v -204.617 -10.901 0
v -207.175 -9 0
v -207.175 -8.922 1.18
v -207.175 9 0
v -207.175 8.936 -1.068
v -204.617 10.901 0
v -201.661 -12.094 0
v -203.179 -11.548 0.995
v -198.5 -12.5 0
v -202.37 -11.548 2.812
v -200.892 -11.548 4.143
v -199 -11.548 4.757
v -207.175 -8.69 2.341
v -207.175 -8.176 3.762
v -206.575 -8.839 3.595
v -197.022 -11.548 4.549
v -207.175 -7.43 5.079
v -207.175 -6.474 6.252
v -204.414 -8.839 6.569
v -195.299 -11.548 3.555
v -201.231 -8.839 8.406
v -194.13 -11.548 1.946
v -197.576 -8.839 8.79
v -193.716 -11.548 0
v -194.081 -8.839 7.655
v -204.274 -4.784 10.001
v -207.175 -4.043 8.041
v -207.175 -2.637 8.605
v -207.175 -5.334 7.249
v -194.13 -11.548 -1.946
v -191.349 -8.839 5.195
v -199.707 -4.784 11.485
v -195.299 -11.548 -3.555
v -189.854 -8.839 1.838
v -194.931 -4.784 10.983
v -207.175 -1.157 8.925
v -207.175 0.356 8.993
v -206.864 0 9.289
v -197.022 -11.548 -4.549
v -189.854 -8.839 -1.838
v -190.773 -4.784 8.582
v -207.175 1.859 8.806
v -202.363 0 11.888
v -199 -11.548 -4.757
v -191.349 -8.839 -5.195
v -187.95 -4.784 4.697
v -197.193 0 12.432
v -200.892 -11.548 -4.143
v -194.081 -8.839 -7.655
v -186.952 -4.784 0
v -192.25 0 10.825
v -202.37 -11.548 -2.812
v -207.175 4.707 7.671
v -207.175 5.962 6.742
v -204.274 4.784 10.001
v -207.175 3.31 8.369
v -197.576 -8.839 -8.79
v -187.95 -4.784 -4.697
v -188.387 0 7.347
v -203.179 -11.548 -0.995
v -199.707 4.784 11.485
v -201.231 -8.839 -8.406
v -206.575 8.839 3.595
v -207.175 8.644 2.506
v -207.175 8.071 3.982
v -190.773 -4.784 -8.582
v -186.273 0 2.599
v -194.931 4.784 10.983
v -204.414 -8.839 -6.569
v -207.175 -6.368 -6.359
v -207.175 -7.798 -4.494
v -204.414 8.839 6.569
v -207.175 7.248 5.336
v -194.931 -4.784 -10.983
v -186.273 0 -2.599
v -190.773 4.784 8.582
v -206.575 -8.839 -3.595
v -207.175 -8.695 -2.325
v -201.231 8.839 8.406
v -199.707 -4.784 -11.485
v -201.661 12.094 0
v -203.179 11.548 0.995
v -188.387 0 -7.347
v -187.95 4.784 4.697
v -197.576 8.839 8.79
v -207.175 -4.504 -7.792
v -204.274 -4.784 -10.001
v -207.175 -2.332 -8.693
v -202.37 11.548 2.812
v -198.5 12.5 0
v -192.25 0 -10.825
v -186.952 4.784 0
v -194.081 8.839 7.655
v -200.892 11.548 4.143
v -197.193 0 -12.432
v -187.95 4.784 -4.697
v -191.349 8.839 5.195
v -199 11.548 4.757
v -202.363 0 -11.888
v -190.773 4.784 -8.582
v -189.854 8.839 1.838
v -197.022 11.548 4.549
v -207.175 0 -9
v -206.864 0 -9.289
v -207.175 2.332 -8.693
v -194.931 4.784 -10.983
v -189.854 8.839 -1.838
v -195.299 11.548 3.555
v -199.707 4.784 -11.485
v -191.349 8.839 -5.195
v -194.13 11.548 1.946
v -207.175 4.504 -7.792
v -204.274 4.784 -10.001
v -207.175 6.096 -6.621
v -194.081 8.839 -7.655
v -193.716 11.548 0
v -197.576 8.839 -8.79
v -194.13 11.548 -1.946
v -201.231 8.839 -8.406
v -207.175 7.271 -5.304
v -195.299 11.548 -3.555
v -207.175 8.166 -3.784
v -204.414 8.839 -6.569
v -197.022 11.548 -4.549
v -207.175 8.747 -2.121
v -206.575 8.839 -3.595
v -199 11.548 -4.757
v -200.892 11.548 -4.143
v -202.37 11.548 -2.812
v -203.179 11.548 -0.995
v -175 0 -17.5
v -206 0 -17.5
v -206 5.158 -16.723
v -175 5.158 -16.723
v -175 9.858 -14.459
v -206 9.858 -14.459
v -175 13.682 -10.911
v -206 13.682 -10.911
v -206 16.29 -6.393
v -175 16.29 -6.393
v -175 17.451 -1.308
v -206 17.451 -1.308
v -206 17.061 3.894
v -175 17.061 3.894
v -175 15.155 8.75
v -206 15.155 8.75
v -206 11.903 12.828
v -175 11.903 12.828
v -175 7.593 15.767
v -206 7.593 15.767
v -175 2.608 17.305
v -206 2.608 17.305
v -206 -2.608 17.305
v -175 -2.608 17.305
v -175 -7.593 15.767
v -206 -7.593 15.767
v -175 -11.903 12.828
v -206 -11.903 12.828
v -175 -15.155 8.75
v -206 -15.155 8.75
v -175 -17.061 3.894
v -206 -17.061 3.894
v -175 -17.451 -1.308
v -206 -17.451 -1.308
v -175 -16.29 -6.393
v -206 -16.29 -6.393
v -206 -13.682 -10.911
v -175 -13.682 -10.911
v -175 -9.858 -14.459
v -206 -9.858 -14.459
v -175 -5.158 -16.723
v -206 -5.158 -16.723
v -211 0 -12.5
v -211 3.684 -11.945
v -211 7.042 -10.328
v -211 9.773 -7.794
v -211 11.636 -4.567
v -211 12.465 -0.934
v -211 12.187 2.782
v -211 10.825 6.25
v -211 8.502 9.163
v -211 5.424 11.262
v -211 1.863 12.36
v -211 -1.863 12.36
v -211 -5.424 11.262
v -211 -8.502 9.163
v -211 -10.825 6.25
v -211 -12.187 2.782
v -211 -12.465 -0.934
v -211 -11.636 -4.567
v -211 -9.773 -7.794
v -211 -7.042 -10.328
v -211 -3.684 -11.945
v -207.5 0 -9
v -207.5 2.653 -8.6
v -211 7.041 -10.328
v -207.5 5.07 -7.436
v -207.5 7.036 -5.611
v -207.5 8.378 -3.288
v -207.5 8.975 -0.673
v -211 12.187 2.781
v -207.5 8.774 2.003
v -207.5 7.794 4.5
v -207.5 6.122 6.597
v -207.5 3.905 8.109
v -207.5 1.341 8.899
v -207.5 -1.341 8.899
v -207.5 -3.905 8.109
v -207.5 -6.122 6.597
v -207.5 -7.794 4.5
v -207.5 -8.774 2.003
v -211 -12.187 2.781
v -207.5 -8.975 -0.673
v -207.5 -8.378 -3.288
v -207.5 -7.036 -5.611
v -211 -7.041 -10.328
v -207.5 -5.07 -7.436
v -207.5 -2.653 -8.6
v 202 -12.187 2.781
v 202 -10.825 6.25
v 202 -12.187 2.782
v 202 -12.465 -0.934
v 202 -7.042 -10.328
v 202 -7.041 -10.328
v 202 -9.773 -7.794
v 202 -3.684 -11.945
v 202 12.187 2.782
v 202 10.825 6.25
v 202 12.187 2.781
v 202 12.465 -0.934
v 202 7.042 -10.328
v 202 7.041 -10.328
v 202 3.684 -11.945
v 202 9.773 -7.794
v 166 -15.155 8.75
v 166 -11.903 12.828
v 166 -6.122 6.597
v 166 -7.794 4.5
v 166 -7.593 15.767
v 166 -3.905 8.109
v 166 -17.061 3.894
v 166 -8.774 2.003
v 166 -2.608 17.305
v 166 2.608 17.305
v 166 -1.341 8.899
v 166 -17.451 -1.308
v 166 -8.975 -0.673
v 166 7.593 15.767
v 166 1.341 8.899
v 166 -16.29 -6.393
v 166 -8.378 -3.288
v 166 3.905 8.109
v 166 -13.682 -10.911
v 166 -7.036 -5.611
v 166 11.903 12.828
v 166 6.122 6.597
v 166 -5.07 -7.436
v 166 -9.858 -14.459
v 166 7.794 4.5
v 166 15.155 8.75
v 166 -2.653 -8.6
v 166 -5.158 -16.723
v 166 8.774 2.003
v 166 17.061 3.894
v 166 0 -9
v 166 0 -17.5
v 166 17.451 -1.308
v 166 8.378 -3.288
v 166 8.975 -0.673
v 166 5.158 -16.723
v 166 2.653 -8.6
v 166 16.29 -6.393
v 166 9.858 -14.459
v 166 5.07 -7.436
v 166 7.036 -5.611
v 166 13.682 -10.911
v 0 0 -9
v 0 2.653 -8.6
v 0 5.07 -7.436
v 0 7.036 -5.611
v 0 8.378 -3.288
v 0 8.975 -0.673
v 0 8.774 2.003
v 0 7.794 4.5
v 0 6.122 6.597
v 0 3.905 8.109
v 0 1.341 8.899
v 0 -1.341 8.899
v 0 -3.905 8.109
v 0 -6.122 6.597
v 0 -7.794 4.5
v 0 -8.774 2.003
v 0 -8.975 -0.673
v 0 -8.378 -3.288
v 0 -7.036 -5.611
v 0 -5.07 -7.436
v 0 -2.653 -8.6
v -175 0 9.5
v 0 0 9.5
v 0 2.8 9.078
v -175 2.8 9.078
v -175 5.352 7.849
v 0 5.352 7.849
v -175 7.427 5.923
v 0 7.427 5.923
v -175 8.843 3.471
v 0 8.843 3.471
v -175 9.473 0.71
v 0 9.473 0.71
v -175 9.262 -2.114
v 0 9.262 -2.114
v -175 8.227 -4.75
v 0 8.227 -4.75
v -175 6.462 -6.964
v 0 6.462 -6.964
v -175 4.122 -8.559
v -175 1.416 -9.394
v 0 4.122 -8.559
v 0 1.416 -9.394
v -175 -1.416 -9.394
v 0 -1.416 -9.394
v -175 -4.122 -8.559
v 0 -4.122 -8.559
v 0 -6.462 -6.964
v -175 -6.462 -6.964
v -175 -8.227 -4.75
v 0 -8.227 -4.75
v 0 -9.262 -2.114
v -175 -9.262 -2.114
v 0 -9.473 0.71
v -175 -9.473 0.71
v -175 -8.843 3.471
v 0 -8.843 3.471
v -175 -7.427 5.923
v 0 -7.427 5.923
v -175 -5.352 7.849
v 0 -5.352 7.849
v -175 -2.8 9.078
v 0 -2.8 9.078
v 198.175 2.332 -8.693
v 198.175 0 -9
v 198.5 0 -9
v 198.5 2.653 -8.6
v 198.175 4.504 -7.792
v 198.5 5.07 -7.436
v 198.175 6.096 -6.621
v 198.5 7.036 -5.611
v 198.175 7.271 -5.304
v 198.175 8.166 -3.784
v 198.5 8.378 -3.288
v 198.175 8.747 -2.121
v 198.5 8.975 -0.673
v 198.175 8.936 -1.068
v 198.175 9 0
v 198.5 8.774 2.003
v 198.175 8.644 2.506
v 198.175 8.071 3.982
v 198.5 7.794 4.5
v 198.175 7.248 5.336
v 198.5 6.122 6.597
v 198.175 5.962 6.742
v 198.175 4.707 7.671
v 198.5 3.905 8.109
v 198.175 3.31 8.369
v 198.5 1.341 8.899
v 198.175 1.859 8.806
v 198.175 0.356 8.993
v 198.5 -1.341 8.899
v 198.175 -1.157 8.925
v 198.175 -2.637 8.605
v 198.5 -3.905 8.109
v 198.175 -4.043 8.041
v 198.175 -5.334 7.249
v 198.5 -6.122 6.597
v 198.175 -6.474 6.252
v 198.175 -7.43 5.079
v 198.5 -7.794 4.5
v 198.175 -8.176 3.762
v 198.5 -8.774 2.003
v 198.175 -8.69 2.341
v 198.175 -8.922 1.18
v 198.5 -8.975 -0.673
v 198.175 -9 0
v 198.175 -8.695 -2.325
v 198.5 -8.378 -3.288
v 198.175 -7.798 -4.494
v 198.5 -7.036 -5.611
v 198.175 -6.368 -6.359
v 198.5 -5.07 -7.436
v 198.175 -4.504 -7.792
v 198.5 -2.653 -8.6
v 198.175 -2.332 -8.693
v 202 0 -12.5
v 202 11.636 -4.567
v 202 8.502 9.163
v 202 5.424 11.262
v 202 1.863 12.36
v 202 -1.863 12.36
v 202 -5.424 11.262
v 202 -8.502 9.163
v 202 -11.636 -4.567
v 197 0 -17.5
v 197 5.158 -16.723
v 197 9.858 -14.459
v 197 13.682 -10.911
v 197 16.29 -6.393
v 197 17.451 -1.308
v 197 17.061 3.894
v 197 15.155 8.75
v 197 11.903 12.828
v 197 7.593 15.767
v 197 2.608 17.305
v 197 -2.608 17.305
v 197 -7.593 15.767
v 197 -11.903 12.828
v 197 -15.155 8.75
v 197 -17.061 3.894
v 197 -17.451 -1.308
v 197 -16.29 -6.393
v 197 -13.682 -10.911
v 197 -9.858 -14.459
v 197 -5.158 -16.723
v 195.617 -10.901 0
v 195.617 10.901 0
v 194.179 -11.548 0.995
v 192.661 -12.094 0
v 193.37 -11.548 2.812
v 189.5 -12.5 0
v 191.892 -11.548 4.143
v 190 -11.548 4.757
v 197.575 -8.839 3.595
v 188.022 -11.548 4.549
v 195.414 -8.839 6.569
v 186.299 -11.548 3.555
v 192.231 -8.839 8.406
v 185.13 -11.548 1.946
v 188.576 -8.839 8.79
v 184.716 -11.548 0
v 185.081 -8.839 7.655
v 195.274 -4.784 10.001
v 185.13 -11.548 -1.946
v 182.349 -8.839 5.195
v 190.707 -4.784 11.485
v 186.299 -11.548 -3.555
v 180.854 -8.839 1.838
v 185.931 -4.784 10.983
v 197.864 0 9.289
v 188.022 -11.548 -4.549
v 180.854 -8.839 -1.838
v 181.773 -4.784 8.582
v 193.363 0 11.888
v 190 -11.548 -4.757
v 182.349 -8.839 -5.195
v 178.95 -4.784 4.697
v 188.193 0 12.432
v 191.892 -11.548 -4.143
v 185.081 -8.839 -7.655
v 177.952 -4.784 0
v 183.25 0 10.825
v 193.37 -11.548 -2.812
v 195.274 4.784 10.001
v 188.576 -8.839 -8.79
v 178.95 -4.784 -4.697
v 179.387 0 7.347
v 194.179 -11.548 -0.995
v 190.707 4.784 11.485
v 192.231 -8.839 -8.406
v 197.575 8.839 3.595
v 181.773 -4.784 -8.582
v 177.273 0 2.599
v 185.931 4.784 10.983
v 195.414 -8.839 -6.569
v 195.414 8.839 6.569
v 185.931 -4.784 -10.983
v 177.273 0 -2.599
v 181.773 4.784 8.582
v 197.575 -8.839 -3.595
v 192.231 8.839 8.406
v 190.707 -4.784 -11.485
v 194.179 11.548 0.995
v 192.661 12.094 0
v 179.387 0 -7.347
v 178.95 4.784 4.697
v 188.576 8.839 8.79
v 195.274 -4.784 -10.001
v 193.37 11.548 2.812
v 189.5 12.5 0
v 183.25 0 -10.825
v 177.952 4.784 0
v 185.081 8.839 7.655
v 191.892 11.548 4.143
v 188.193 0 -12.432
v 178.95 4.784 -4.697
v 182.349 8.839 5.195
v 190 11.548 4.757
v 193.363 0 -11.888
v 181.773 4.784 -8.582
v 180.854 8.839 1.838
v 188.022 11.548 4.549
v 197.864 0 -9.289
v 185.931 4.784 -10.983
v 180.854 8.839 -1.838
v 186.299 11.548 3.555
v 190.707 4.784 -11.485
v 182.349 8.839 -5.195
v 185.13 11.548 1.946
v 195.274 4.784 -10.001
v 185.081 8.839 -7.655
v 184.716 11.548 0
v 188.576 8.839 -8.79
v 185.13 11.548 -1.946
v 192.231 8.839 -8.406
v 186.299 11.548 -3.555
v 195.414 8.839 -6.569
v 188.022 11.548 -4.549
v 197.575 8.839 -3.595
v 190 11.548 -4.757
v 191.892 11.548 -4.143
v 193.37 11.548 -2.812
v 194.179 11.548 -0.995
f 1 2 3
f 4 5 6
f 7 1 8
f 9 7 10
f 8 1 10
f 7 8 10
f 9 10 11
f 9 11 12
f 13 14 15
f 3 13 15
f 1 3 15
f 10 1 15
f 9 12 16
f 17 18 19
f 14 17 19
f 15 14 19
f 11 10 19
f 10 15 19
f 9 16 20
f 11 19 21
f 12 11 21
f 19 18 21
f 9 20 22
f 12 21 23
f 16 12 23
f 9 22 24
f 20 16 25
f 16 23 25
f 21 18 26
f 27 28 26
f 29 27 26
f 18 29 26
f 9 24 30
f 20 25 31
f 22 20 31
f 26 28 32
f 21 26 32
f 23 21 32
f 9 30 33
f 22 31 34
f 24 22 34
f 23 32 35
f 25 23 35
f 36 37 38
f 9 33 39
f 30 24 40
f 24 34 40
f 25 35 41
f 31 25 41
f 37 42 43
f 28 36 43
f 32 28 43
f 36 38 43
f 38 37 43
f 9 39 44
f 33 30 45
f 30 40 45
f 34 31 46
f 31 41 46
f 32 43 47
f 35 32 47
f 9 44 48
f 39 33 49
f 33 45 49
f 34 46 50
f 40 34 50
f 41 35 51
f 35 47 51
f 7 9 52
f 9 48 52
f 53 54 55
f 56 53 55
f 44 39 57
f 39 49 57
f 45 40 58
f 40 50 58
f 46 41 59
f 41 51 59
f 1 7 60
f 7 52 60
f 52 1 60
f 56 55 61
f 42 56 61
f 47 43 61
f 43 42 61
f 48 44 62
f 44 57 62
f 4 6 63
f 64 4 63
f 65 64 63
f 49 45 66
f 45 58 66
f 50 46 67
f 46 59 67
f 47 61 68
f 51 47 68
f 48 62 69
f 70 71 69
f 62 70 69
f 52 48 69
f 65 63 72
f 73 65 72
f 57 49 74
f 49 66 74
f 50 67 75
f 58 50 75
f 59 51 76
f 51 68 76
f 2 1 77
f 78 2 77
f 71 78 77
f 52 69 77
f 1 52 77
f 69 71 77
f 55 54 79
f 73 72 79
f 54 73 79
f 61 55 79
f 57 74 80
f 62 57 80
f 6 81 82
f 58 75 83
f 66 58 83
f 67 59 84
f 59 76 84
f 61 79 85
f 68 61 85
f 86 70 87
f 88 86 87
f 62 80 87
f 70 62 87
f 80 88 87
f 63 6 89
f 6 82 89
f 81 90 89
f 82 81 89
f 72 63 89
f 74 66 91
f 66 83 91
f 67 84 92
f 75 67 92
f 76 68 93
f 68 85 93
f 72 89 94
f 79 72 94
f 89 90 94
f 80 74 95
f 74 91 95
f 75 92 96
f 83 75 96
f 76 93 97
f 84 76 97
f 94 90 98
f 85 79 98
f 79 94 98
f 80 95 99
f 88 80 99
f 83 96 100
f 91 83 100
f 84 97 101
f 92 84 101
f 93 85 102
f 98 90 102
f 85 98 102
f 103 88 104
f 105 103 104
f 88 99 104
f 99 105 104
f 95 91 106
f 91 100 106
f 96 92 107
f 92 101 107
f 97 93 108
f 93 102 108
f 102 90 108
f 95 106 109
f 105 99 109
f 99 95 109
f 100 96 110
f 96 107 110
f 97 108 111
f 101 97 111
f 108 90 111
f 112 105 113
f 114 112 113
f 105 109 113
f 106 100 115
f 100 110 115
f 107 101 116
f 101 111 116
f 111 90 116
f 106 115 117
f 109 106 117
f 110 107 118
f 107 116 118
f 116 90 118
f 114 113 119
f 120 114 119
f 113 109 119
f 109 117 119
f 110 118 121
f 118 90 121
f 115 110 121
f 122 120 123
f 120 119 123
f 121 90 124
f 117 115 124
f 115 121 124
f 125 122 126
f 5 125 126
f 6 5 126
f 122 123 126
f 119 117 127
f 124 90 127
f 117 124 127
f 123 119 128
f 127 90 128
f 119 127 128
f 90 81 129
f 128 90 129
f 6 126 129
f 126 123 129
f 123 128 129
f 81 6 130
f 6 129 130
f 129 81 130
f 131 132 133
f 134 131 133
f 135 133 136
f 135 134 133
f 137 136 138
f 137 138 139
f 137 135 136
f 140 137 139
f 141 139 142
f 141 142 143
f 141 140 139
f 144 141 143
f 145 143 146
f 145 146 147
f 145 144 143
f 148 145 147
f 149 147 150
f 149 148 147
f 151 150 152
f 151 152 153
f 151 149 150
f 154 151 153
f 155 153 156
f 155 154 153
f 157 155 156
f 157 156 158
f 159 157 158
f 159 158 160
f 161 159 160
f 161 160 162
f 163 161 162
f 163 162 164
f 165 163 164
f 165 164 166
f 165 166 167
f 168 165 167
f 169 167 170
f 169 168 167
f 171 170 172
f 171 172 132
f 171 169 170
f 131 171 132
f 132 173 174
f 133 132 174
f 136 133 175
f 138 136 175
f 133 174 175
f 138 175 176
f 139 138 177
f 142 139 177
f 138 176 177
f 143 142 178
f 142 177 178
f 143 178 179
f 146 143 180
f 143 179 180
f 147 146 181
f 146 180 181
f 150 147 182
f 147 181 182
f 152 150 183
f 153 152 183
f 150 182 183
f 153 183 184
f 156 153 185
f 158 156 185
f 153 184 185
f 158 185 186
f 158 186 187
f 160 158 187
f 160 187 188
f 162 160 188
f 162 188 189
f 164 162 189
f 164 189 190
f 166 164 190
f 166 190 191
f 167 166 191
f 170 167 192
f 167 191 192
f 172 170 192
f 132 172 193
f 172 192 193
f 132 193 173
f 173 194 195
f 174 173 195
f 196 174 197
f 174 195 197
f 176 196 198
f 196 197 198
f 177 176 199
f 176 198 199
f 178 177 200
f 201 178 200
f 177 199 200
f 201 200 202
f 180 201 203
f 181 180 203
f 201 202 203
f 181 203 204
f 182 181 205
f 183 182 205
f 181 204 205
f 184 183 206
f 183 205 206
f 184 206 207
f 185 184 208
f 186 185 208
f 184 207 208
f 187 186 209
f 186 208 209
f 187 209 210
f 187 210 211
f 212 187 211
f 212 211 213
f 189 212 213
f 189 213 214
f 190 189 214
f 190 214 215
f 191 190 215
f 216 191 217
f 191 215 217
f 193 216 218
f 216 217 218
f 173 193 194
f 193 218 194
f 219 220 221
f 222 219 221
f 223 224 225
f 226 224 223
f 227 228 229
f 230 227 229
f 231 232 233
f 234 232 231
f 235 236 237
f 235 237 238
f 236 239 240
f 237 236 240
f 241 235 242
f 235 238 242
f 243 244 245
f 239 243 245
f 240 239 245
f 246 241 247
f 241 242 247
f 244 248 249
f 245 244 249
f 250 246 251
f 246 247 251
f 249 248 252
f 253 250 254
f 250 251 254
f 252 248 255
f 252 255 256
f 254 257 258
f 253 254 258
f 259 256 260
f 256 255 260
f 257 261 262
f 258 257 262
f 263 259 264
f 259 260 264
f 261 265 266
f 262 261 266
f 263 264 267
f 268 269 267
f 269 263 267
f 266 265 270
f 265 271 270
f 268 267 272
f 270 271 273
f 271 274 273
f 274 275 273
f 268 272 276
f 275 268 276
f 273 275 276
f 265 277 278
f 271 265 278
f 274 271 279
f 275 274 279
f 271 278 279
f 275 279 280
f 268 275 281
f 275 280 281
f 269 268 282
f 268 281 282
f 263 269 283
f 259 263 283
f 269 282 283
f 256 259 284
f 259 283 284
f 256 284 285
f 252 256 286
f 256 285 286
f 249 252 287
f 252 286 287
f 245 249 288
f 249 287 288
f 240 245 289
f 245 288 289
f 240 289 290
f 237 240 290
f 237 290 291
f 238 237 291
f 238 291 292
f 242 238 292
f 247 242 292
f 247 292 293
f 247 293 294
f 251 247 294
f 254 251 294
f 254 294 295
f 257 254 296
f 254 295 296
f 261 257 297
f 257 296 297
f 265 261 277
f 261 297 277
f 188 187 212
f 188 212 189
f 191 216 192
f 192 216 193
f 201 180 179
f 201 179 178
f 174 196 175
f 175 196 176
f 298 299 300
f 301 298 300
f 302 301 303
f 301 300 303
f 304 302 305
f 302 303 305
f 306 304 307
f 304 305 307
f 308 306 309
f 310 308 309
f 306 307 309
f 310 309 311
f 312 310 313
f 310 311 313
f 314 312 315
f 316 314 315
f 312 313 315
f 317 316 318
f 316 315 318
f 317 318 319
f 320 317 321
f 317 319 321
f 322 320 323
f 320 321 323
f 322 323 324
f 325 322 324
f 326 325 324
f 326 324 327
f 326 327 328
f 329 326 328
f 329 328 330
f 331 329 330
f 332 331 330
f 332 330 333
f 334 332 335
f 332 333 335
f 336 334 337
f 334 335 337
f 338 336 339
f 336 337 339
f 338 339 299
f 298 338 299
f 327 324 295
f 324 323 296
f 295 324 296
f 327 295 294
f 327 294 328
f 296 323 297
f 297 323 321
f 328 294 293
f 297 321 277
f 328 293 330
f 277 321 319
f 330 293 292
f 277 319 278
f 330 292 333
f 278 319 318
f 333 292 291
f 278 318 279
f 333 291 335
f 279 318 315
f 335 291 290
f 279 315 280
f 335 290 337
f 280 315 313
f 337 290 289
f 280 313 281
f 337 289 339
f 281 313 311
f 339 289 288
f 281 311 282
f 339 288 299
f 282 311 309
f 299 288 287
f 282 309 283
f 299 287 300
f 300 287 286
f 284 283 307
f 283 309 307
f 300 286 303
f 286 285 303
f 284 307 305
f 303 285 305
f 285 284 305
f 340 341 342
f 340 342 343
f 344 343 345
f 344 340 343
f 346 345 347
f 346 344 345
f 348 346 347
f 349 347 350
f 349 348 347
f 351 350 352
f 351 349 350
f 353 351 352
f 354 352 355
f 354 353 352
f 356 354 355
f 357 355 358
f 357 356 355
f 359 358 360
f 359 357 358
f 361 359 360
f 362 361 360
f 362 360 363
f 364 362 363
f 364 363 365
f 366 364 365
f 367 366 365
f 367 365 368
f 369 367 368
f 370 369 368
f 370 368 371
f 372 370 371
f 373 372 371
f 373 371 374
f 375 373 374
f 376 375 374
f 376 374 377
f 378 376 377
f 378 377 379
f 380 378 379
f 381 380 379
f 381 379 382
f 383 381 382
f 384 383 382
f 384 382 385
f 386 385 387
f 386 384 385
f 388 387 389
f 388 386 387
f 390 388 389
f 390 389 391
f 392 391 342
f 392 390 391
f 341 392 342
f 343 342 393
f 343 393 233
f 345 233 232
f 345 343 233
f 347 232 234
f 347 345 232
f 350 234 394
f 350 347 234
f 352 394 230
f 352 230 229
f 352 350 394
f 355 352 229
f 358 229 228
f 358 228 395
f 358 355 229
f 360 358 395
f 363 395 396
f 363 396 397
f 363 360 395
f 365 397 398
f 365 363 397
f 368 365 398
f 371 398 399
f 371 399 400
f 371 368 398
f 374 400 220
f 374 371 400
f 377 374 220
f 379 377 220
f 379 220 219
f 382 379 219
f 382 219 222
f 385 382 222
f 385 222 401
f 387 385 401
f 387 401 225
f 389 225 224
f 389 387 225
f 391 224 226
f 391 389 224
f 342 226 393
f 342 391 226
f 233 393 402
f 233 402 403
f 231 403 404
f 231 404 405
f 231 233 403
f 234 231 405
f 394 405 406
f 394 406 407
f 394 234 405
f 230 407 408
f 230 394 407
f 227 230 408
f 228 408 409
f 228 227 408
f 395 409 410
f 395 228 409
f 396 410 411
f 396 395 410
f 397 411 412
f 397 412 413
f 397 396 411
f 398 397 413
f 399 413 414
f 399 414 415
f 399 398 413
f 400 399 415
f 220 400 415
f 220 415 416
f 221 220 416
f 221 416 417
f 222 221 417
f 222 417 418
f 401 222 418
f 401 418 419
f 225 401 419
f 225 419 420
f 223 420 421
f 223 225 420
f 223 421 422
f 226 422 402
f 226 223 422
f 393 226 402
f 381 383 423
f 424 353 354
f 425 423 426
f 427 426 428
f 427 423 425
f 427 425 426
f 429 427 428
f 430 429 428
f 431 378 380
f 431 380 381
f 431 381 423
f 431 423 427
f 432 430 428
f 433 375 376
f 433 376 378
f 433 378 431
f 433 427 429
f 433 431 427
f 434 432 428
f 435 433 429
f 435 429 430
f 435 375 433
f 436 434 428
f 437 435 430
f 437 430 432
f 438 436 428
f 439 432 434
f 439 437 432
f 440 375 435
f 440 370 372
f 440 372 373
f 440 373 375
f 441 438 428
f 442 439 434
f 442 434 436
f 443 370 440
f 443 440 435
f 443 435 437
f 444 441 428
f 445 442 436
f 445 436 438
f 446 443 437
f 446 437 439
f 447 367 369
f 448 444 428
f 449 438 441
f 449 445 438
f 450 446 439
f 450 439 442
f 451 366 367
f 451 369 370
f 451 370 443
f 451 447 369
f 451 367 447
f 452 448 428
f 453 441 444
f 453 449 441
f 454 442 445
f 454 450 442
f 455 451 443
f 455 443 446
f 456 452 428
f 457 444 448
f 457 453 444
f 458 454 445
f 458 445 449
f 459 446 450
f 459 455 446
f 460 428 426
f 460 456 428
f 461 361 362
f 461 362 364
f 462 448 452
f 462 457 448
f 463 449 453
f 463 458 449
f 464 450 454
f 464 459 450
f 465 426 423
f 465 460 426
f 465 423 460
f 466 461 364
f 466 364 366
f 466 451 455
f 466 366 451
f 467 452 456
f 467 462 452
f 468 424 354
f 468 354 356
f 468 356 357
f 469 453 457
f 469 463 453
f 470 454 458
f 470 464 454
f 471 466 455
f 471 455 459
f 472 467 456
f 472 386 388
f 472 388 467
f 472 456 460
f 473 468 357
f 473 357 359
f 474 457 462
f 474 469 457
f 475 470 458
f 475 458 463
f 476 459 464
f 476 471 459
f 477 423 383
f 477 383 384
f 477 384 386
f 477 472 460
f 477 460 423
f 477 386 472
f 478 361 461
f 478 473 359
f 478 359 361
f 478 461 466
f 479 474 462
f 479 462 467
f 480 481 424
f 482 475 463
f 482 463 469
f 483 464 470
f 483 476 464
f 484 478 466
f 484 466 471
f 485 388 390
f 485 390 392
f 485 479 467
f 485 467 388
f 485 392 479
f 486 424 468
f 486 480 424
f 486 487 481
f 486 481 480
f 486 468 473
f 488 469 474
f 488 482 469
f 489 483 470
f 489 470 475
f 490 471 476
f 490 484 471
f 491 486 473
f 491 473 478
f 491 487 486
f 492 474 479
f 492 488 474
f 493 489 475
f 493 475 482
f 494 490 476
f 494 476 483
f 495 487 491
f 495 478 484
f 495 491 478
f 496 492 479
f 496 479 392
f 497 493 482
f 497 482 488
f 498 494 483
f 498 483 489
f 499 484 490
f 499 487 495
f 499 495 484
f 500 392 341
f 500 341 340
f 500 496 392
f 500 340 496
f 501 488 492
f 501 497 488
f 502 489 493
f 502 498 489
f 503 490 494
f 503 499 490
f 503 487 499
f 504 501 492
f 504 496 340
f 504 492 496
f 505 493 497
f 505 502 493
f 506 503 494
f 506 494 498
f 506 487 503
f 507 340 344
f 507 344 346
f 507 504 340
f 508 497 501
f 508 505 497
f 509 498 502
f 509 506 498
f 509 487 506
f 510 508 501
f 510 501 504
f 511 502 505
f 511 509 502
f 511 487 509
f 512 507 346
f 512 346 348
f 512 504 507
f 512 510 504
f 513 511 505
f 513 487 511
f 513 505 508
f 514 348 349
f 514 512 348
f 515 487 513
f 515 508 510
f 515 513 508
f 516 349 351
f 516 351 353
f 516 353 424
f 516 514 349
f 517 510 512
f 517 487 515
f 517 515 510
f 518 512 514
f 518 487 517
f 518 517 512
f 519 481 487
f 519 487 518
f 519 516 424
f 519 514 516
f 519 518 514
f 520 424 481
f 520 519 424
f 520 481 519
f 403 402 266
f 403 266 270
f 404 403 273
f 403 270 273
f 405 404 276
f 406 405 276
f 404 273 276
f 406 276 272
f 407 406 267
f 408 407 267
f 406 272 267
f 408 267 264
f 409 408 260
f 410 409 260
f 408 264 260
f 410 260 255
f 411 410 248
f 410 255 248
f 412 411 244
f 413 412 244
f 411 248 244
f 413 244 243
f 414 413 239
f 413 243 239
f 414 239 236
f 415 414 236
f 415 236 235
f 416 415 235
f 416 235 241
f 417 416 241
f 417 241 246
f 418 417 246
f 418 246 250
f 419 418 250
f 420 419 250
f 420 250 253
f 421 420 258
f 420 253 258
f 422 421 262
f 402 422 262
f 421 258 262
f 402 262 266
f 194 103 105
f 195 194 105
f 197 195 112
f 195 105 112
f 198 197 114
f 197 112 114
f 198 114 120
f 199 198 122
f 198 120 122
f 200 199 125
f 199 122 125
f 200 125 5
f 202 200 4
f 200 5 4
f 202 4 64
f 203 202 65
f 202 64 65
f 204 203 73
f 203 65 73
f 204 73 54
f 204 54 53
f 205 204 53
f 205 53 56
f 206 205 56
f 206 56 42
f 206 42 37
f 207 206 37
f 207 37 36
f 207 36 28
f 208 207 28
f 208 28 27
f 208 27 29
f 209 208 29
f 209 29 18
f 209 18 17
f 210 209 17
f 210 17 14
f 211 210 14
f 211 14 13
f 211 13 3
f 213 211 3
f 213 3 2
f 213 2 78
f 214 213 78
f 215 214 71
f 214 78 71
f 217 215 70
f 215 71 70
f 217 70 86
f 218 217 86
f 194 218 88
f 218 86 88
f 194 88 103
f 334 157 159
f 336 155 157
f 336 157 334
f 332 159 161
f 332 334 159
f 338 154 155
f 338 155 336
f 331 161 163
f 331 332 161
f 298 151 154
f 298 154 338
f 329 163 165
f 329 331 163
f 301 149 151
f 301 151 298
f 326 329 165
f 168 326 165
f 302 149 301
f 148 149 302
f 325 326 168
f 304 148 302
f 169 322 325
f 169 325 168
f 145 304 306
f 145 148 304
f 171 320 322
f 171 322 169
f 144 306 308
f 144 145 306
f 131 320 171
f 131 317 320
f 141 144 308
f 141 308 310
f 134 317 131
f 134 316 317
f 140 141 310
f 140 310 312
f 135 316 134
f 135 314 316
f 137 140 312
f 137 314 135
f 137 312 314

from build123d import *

# Parameters (mm, degrees)
SZKIC1_R                    = 9
DODANIE_WYCI_GNI_CIE1_DEPTH = 166
SZKIC2_R                    = 9.5
DODANIE_WYCI_GNI_CIE2_DEPTH = 175
SZKIC3_R                    = 17.5
DODANIE_WYCI_GNI_CIE3_DEPTH = 36
SFAZOWANIE1_SIZE            = 5
WYTNIJ_WYCI_GNI_CIE1_START  = -10
SZKIC8_R                    = 9
WYTNIJ_WYCI_GNI_CIE1_DEPTH  = 10
SFAZOWANIE3_SIZE            = 3.5
SFAZOWANIE1_OF_LUSTRO7_SIZE = 5
SFAZOWANIE3_OF_LUSTRO7_SIZE = 3.5


with BuildPart() as part:
    # Szkic1 → Dodanie-wyciągnięcie1 (new body)
    with BuildSketch(Plane(origin=(0, 0, 0), x_dir=(0, 0, -1), z_dir=(1, 0, 0))):
        Circle(SZKIC1_R)
    extrude(amount=DODANIE_WYCI_GNI_CIE1_DEPTH)

    # Szkic2 → Dodanie-wyciągnięcie2 (add)
    with BuildSketch(Plane.ZY):
        Circle(SZKIC2_R)
    extrude(amount=DODANIE_WYCI_GNI_CIE2_DEPTH)

    # Szkic3 → Dodanie-wyciągnięcie3 (add)
    with BuildSketch(Plane(origin=(166, 0, 0), x_dir=(0, 0, -1), z_dir=(1, 0, 0))):
        Circle(SZKIC3_R)
    dodanie_wyci_gni_cie3 = extrude(amount=DODANIE_WYCI_GNI_CIE3_DEPTH)

    # Sfazowanie1
    sfazowanie1_edges = [part.edges().sort_by_distance(p)[0] for p in [
        (202, 0, 17.5),
    ]]
    chamfer(sfazowanie1_edges, length=SFAZOWANIE1_SIZE)

    # Szkic8 → Wytnij-wyciągnięcie1 (cut)
    with BuildSketch(Plane(origin=(202, 0, 0), x_dir=(0, 0, -1), z_dir=(1, 0, 0)).offset(WYTNIJ_WYCI_GNI_CIE1_START)):
        Circle(SZKIC8_R)
    wytnij_wyci_gni_cie1 = extrude(amount=WYTNIJ_WYCI_GNI_CIE1_DEPTH, mode=Mode.SUBTRACT)

    # Szkic4 → Wycięcie-obrót9 (revolve, cut)
    with BuildSketch(Plane.XY):
        with BuildLine():
            Line((189.5, 12.5), (189.5, -12.5))
            ThreePointArc((189.5, -12.5), (202, 0), (189.5, 12.5))
        make_face()
    wyci_cie_obr_t9 = revolve(axis=Axis((189.5, 12.5, 0), (0, -1, 0)), mode=Mode.SUBTRACT)

    # Sfazowanie3
    sfazowanie3_edges = [part.edges().sort_by_distance(p)[0] for p in [
        (202, 0, 9),
    ]]
    chamfer(sfazowanie3_edges, length=SFAZOWANIE3_SIZE - 0.0001)  # a hair under: the kernel refuses the full size

    # Lustro7: Dodanie-wyciągnięcie3, Wytnij-wyciągnięcie1, Wycięcie-obrót9 across plane
    add(dodanie_wyci_gni_cie3.mirror(Plane.ZY.offset(4.5)))
    add(wytnij_wyci_gni_cie1.mirror(Plane.ZY.offset(4.5)), mode=Mode.SUBTRACT)
    add(wyci_cie_obr_t9.mirror(Plane.ZY.offset(4.5)), mode=Mode.SUBTRACT)

    # Sfazowanie1 of Lustro7
    sfazowanie1_of_lustro7_edges = [part.edges().sort_by_distance(p)[0] for p in [
        (-211, 0, 17.5),
    ]]
    chamfer(sfazowanie1_of_lustro7_edges, length=SFAZOWANIE1_OF_LUSTRO7_SIZE)

    # Sfazowanie3 of Lustro7
    sfazowanie3_of_lustro7_edges = [part.edges().sort_by_distance(p)[0] for p in [
        (-211, 0, 9),
    ]]
    chamfer(sfazowanie3_of_lustro7_edges, length=SFAZOWANIE3_OF_LUSTRO7_SIZE - 0.0001)  # a hair under: the kernel refuses the full size


solid = part.part
